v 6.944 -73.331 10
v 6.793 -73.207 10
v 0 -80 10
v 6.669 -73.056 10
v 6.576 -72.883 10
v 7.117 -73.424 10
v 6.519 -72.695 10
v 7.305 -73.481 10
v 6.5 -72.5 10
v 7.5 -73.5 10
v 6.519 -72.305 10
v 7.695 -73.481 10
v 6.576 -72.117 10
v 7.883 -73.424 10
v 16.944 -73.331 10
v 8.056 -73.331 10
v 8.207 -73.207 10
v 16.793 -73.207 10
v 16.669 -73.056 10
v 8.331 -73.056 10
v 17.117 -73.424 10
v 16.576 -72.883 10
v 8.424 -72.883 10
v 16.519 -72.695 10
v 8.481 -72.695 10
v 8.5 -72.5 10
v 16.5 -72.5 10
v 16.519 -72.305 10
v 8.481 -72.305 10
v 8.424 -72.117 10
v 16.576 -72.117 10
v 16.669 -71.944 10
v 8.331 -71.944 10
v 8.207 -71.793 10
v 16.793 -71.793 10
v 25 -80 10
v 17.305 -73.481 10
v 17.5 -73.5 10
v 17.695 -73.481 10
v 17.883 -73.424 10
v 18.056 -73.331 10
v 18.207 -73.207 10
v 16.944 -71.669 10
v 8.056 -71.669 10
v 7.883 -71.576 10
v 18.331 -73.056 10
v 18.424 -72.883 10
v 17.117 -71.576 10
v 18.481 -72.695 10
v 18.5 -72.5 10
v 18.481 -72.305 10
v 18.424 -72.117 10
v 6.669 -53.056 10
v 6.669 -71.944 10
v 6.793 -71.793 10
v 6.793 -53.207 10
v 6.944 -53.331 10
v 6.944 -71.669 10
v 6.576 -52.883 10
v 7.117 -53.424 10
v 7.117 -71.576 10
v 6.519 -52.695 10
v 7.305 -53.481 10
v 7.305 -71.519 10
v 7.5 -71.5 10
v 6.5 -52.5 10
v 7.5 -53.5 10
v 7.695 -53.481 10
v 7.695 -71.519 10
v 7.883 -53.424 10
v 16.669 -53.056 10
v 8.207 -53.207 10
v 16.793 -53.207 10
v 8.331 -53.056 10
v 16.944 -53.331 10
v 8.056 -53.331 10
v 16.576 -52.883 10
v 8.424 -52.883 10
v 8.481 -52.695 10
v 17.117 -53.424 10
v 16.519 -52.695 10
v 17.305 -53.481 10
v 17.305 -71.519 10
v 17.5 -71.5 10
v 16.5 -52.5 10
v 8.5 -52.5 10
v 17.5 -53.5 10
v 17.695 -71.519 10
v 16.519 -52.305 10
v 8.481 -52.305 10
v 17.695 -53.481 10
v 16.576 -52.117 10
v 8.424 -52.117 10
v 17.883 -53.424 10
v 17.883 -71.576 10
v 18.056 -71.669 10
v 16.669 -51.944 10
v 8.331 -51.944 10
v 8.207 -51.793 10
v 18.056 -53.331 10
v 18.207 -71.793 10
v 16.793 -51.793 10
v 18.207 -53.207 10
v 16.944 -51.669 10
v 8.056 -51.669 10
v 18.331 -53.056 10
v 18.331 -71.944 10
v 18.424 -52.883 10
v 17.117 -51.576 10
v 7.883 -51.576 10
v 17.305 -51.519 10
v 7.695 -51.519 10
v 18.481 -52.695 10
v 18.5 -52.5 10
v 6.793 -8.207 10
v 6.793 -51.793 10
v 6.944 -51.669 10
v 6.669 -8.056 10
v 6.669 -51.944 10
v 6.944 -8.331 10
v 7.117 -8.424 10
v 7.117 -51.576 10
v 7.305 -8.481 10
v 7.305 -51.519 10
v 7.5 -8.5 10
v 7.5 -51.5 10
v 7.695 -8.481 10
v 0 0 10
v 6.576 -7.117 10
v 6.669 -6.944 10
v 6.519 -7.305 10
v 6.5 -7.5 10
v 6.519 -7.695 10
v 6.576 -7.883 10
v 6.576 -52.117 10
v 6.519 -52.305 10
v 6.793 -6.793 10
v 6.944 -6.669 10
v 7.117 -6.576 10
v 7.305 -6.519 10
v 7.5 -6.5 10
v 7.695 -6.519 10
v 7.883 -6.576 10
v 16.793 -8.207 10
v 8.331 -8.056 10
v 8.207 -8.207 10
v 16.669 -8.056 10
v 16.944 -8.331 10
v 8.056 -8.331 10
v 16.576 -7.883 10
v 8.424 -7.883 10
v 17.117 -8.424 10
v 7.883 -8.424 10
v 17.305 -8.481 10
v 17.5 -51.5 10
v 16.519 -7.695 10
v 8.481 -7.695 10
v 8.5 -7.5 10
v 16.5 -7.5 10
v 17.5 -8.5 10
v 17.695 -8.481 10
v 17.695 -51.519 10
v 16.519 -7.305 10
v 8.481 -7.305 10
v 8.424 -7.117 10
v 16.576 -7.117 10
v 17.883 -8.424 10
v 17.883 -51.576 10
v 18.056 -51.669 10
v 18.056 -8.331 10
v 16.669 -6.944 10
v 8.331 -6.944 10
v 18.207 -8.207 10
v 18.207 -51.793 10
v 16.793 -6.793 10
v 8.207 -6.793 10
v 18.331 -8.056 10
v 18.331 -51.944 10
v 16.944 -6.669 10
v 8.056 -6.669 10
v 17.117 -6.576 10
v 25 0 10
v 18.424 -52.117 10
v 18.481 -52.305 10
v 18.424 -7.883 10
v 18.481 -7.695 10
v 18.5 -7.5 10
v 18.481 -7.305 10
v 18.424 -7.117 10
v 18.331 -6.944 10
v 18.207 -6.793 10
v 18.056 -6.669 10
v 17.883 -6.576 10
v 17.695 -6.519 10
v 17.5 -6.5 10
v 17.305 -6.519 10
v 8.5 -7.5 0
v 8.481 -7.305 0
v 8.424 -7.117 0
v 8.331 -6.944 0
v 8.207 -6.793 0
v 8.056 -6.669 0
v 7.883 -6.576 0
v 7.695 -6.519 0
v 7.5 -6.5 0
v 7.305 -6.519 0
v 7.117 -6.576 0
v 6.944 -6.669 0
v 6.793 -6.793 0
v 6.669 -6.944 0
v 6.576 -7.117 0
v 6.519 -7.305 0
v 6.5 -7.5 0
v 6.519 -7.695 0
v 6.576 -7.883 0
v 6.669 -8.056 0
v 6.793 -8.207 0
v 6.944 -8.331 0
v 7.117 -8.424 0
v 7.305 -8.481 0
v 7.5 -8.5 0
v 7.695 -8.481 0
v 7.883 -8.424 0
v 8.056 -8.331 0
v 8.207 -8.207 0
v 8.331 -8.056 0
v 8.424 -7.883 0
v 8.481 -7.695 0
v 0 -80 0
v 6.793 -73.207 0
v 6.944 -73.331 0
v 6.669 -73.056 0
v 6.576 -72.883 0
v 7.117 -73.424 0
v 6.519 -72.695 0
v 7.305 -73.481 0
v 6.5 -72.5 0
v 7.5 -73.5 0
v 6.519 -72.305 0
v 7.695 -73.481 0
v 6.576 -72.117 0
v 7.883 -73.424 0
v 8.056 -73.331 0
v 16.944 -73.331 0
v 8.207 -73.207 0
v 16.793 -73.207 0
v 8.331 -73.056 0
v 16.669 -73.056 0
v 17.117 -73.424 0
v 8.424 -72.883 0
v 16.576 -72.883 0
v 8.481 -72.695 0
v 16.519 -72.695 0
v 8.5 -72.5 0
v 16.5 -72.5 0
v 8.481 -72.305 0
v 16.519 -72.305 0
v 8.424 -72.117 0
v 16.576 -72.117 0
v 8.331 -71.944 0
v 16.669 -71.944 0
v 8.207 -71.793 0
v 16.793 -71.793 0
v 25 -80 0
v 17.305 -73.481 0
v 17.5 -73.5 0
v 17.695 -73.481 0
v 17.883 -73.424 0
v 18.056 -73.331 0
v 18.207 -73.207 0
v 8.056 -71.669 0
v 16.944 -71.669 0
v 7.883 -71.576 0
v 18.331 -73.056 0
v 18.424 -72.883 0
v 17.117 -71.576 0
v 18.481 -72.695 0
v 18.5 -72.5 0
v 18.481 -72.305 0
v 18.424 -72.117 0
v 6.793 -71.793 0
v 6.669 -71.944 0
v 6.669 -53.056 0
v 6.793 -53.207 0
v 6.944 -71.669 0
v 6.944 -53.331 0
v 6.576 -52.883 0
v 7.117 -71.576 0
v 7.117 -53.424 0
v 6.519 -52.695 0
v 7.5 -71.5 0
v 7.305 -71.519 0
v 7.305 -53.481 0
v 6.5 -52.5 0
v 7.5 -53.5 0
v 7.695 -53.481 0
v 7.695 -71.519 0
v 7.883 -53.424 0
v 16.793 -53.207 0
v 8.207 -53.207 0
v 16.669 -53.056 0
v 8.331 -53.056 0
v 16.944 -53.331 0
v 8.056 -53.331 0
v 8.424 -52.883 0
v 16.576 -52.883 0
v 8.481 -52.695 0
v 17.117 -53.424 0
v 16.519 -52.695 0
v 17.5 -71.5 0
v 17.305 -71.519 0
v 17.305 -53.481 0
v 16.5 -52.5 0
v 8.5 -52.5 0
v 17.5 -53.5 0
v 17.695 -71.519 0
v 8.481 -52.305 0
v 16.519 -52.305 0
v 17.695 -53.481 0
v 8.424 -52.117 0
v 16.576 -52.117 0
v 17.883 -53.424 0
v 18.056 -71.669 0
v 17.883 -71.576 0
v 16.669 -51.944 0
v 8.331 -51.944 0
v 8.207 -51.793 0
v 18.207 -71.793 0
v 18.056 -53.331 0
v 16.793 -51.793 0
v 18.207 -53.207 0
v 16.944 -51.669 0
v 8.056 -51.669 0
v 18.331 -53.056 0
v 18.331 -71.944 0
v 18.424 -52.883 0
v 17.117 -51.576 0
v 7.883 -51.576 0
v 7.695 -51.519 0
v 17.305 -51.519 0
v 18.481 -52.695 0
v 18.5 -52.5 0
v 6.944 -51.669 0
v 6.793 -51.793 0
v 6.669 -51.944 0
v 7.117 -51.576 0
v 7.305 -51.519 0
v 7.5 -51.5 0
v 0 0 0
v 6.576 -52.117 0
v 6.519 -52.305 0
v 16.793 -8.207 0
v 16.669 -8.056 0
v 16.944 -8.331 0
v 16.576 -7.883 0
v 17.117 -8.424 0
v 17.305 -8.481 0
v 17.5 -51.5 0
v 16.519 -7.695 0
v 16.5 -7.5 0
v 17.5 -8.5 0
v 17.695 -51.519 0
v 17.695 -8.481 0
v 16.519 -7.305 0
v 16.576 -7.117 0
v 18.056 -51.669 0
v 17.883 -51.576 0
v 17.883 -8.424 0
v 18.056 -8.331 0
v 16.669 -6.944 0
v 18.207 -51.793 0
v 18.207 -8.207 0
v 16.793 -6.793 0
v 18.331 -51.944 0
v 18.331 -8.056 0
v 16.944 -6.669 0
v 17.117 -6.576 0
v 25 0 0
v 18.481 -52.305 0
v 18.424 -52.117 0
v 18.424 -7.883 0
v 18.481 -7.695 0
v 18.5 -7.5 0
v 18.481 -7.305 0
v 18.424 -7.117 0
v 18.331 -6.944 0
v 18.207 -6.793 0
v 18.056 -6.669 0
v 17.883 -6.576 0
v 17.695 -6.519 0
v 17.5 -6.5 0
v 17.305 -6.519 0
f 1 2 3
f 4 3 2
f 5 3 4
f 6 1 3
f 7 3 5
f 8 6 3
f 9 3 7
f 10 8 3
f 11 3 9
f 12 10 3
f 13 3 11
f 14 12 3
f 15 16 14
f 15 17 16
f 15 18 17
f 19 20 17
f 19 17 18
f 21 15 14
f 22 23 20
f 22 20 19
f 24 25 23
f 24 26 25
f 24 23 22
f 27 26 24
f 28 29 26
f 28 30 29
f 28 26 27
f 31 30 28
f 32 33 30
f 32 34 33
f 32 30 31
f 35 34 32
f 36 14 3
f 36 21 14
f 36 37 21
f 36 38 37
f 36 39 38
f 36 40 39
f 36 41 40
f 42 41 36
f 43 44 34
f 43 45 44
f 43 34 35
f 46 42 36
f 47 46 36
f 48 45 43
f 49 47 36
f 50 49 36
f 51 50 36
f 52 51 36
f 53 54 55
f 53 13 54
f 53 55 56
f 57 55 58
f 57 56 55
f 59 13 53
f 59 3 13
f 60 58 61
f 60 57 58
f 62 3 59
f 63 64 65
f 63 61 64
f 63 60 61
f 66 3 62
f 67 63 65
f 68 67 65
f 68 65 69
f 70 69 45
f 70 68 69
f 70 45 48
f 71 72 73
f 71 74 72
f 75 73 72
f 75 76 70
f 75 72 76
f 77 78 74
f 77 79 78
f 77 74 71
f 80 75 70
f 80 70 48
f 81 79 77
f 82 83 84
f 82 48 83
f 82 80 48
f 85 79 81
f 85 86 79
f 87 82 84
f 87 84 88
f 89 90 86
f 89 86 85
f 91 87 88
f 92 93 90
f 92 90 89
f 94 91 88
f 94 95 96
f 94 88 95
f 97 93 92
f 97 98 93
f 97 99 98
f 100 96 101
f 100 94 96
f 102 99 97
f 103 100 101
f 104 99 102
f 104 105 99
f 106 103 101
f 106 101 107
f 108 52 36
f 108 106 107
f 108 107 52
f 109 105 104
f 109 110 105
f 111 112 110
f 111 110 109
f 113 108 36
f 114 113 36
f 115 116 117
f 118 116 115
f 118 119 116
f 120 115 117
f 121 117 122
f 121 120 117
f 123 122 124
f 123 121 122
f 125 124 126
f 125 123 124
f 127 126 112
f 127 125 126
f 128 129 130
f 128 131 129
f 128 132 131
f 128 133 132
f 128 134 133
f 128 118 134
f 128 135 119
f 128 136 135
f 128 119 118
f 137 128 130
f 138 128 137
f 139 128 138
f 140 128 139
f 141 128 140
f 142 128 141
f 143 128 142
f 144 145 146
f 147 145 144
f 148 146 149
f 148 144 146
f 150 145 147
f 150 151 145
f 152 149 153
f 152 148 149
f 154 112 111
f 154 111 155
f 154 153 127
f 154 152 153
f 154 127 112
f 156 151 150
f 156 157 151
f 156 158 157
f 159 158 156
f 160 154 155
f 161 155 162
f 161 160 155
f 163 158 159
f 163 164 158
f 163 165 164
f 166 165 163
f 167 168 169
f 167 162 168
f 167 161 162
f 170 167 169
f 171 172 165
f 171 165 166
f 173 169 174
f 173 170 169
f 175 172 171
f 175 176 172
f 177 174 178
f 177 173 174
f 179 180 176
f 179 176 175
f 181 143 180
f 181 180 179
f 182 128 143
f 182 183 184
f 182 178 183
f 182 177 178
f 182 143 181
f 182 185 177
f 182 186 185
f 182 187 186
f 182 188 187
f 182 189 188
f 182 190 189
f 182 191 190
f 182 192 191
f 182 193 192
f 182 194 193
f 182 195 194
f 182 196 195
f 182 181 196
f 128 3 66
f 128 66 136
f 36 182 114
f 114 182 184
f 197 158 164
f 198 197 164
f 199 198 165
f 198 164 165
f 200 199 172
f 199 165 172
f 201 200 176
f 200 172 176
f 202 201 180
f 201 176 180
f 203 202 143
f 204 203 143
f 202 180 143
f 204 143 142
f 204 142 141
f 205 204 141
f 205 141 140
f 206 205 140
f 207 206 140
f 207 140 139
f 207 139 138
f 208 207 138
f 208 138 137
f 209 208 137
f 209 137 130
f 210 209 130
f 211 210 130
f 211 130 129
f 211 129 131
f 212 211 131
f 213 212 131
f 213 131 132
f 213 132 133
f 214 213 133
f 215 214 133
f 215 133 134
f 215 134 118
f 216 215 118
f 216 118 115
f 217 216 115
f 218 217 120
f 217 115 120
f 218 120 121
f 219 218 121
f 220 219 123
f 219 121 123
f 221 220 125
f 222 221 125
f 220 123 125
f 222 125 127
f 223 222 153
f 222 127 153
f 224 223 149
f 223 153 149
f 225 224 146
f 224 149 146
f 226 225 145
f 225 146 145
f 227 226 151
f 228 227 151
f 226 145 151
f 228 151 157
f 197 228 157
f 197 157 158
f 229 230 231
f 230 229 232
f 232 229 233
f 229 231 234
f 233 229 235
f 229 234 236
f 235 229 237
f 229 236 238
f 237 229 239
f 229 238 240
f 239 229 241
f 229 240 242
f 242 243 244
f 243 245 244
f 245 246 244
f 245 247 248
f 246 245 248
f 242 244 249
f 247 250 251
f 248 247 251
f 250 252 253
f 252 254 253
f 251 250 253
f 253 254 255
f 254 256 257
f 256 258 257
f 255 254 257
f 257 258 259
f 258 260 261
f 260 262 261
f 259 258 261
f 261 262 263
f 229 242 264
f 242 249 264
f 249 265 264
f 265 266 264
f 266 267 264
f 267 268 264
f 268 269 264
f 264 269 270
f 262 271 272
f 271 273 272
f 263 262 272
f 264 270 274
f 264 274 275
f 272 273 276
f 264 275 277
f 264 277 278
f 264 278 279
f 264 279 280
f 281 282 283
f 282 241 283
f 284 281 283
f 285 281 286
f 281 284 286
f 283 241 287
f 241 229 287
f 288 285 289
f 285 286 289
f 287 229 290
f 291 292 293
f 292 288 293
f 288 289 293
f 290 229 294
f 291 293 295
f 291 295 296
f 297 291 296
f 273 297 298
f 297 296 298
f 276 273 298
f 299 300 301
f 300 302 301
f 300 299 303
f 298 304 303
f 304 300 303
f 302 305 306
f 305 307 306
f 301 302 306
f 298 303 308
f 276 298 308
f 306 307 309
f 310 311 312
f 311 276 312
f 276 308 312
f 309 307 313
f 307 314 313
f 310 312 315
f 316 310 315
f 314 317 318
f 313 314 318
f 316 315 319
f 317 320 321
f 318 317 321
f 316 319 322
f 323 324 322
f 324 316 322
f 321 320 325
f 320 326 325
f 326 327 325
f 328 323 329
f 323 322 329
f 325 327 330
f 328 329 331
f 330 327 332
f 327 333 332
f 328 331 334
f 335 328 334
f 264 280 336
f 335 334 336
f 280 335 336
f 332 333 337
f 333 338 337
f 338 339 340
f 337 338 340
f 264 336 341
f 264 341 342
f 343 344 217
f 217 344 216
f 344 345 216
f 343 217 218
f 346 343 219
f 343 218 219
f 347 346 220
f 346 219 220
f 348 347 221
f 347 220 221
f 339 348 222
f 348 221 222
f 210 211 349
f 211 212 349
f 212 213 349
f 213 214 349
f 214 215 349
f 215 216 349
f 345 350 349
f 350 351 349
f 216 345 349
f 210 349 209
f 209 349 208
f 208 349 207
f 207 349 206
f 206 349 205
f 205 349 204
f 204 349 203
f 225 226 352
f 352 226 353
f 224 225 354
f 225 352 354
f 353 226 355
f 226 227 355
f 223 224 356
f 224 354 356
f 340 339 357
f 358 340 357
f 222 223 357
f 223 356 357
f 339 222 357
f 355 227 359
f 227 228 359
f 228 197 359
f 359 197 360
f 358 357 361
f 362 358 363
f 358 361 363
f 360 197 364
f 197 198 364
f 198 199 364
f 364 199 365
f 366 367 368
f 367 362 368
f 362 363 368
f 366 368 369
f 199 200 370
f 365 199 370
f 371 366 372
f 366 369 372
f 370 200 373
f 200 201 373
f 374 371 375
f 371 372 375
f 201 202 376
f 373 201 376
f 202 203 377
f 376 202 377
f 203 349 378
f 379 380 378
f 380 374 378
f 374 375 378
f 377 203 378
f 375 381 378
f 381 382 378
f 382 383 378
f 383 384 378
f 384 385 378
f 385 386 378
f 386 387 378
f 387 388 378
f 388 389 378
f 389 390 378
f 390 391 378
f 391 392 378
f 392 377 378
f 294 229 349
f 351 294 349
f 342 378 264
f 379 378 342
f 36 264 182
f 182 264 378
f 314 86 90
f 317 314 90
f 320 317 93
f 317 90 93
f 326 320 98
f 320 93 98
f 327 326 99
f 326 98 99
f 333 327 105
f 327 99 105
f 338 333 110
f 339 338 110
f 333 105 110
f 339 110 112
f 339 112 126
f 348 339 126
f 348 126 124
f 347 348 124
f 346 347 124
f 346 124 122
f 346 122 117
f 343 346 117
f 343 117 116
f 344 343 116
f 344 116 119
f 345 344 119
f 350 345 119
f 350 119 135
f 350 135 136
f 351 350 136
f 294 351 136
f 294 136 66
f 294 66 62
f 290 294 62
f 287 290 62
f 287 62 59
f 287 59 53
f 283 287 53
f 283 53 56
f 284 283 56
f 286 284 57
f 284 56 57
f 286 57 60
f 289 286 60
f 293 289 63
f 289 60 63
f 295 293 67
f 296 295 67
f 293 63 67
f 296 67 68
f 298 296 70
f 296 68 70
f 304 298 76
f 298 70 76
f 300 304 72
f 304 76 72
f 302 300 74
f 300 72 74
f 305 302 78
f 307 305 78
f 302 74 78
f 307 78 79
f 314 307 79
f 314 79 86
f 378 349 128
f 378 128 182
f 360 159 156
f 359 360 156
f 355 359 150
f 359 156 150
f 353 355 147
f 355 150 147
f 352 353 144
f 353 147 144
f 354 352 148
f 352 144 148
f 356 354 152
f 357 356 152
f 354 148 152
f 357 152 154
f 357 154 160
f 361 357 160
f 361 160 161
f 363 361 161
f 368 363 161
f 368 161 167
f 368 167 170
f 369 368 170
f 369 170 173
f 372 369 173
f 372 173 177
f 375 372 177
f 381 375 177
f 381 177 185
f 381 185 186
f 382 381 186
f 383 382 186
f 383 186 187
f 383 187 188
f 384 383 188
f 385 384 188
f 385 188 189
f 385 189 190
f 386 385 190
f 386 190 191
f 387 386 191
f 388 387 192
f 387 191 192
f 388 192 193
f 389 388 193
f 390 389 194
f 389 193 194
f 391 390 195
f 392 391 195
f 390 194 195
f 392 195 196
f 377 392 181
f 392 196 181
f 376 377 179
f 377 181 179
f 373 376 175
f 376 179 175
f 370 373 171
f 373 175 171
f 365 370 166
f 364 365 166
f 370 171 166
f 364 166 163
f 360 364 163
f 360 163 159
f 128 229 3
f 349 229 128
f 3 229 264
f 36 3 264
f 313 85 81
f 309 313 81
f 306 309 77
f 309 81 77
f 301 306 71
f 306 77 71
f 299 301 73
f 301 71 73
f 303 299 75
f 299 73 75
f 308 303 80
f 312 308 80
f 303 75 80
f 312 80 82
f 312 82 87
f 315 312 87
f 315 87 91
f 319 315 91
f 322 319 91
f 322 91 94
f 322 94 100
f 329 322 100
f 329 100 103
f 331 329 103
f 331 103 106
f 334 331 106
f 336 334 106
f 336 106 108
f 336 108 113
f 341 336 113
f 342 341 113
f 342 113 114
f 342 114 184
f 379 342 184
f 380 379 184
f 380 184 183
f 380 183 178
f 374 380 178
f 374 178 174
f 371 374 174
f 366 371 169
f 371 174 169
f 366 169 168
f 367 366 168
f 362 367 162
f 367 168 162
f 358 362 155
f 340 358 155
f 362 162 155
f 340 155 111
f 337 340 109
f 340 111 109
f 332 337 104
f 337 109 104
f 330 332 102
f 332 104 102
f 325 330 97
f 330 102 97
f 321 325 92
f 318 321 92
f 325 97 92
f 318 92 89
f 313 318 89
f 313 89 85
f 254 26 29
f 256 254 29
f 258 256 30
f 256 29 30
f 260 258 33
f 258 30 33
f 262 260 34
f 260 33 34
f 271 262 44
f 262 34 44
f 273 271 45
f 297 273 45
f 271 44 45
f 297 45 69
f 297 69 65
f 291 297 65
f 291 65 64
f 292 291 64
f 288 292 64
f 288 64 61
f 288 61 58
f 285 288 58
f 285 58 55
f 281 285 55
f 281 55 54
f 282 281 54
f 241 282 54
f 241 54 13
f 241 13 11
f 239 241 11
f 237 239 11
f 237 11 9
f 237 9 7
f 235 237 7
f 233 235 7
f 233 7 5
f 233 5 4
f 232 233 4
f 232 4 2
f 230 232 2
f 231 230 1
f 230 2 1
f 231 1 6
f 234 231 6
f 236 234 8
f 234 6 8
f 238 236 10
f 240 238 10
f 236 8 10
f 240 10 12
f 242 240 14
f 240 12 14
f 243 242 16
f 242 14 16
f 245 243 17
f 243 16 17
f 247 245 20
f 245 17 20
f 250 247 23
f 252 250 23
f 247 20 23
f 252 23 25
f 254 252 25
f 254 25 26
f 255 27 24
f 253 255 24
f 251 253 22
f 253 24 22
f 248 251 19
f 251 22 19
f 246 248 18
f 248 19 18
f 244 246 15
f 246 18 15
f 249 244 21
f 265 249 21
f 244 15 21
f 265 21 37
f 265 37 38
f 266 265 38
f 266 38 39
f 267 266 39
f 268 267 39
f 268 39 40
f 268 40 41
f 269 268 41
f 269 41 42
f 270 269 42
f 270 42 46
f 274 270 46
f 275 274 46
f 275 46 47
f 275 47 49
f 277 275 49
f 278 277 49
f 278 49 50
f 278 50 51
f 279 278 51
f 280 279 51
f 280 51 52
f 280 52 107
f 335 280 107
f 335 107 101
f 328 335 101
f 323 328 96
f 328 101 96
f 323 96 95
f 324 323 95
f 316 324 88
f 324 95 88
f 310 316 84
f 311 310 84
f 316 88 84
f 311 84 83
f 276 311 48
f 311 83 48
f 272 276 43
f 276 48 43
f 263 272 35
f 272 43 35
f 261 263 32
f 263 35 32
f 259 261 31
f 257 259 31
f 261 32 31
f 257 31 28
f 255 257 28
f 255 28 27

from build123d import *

# Parameters (mm, degrees)
SKETCH1_W           = 25
SKETCH1_H           = 80
BOSS_EXTRUDE1_DEPTH = 10
SKETCH2_R           = 1
CUT_EXTRUDE1_DEPTH  = 85.409715081


with BuildPart() as part:
    # Sketch1 → Boss-Extrude1 (new body)
    with BuildSketch(Plane.XY):
        with Locations((12.5, -40)):
            Rectangle(SKETCH1_W, SKETCH1_H)
    extrude(amount=BOSS_EXTRUDE1_DEPTH)

    # Sketch2 → Cut-Extrude1 (cut, through all)
    with BuildSketch(Plane.XY.offset(10)):
        with Locations((7.5, -52.5)):
            Circle(SKETCH2_R)
        with Locations((7.5, -72.5)):
            Circle(SKETCH2_R)
        with Locations((7.5, -7.5)):
            Circle(SKETCH2_R)
        with Locations(Location((17.5, -7.5, 0), (0, 0, 180))):
            Circle(SKETCH2_R)
        with Locations(Location((17.5, -52.5, 0), (0, 0, 180))):
            Circle(SKETCH2_R)
        with Locations(Location((17.5, -72.5, 0), (0, 0, 180))):
            Circle(SKETCH2_R)
    extrude(amount=-CUT_EXTRUDE1_DEPTH, mode=Mode.SUBTRACT)


solid = part.part
